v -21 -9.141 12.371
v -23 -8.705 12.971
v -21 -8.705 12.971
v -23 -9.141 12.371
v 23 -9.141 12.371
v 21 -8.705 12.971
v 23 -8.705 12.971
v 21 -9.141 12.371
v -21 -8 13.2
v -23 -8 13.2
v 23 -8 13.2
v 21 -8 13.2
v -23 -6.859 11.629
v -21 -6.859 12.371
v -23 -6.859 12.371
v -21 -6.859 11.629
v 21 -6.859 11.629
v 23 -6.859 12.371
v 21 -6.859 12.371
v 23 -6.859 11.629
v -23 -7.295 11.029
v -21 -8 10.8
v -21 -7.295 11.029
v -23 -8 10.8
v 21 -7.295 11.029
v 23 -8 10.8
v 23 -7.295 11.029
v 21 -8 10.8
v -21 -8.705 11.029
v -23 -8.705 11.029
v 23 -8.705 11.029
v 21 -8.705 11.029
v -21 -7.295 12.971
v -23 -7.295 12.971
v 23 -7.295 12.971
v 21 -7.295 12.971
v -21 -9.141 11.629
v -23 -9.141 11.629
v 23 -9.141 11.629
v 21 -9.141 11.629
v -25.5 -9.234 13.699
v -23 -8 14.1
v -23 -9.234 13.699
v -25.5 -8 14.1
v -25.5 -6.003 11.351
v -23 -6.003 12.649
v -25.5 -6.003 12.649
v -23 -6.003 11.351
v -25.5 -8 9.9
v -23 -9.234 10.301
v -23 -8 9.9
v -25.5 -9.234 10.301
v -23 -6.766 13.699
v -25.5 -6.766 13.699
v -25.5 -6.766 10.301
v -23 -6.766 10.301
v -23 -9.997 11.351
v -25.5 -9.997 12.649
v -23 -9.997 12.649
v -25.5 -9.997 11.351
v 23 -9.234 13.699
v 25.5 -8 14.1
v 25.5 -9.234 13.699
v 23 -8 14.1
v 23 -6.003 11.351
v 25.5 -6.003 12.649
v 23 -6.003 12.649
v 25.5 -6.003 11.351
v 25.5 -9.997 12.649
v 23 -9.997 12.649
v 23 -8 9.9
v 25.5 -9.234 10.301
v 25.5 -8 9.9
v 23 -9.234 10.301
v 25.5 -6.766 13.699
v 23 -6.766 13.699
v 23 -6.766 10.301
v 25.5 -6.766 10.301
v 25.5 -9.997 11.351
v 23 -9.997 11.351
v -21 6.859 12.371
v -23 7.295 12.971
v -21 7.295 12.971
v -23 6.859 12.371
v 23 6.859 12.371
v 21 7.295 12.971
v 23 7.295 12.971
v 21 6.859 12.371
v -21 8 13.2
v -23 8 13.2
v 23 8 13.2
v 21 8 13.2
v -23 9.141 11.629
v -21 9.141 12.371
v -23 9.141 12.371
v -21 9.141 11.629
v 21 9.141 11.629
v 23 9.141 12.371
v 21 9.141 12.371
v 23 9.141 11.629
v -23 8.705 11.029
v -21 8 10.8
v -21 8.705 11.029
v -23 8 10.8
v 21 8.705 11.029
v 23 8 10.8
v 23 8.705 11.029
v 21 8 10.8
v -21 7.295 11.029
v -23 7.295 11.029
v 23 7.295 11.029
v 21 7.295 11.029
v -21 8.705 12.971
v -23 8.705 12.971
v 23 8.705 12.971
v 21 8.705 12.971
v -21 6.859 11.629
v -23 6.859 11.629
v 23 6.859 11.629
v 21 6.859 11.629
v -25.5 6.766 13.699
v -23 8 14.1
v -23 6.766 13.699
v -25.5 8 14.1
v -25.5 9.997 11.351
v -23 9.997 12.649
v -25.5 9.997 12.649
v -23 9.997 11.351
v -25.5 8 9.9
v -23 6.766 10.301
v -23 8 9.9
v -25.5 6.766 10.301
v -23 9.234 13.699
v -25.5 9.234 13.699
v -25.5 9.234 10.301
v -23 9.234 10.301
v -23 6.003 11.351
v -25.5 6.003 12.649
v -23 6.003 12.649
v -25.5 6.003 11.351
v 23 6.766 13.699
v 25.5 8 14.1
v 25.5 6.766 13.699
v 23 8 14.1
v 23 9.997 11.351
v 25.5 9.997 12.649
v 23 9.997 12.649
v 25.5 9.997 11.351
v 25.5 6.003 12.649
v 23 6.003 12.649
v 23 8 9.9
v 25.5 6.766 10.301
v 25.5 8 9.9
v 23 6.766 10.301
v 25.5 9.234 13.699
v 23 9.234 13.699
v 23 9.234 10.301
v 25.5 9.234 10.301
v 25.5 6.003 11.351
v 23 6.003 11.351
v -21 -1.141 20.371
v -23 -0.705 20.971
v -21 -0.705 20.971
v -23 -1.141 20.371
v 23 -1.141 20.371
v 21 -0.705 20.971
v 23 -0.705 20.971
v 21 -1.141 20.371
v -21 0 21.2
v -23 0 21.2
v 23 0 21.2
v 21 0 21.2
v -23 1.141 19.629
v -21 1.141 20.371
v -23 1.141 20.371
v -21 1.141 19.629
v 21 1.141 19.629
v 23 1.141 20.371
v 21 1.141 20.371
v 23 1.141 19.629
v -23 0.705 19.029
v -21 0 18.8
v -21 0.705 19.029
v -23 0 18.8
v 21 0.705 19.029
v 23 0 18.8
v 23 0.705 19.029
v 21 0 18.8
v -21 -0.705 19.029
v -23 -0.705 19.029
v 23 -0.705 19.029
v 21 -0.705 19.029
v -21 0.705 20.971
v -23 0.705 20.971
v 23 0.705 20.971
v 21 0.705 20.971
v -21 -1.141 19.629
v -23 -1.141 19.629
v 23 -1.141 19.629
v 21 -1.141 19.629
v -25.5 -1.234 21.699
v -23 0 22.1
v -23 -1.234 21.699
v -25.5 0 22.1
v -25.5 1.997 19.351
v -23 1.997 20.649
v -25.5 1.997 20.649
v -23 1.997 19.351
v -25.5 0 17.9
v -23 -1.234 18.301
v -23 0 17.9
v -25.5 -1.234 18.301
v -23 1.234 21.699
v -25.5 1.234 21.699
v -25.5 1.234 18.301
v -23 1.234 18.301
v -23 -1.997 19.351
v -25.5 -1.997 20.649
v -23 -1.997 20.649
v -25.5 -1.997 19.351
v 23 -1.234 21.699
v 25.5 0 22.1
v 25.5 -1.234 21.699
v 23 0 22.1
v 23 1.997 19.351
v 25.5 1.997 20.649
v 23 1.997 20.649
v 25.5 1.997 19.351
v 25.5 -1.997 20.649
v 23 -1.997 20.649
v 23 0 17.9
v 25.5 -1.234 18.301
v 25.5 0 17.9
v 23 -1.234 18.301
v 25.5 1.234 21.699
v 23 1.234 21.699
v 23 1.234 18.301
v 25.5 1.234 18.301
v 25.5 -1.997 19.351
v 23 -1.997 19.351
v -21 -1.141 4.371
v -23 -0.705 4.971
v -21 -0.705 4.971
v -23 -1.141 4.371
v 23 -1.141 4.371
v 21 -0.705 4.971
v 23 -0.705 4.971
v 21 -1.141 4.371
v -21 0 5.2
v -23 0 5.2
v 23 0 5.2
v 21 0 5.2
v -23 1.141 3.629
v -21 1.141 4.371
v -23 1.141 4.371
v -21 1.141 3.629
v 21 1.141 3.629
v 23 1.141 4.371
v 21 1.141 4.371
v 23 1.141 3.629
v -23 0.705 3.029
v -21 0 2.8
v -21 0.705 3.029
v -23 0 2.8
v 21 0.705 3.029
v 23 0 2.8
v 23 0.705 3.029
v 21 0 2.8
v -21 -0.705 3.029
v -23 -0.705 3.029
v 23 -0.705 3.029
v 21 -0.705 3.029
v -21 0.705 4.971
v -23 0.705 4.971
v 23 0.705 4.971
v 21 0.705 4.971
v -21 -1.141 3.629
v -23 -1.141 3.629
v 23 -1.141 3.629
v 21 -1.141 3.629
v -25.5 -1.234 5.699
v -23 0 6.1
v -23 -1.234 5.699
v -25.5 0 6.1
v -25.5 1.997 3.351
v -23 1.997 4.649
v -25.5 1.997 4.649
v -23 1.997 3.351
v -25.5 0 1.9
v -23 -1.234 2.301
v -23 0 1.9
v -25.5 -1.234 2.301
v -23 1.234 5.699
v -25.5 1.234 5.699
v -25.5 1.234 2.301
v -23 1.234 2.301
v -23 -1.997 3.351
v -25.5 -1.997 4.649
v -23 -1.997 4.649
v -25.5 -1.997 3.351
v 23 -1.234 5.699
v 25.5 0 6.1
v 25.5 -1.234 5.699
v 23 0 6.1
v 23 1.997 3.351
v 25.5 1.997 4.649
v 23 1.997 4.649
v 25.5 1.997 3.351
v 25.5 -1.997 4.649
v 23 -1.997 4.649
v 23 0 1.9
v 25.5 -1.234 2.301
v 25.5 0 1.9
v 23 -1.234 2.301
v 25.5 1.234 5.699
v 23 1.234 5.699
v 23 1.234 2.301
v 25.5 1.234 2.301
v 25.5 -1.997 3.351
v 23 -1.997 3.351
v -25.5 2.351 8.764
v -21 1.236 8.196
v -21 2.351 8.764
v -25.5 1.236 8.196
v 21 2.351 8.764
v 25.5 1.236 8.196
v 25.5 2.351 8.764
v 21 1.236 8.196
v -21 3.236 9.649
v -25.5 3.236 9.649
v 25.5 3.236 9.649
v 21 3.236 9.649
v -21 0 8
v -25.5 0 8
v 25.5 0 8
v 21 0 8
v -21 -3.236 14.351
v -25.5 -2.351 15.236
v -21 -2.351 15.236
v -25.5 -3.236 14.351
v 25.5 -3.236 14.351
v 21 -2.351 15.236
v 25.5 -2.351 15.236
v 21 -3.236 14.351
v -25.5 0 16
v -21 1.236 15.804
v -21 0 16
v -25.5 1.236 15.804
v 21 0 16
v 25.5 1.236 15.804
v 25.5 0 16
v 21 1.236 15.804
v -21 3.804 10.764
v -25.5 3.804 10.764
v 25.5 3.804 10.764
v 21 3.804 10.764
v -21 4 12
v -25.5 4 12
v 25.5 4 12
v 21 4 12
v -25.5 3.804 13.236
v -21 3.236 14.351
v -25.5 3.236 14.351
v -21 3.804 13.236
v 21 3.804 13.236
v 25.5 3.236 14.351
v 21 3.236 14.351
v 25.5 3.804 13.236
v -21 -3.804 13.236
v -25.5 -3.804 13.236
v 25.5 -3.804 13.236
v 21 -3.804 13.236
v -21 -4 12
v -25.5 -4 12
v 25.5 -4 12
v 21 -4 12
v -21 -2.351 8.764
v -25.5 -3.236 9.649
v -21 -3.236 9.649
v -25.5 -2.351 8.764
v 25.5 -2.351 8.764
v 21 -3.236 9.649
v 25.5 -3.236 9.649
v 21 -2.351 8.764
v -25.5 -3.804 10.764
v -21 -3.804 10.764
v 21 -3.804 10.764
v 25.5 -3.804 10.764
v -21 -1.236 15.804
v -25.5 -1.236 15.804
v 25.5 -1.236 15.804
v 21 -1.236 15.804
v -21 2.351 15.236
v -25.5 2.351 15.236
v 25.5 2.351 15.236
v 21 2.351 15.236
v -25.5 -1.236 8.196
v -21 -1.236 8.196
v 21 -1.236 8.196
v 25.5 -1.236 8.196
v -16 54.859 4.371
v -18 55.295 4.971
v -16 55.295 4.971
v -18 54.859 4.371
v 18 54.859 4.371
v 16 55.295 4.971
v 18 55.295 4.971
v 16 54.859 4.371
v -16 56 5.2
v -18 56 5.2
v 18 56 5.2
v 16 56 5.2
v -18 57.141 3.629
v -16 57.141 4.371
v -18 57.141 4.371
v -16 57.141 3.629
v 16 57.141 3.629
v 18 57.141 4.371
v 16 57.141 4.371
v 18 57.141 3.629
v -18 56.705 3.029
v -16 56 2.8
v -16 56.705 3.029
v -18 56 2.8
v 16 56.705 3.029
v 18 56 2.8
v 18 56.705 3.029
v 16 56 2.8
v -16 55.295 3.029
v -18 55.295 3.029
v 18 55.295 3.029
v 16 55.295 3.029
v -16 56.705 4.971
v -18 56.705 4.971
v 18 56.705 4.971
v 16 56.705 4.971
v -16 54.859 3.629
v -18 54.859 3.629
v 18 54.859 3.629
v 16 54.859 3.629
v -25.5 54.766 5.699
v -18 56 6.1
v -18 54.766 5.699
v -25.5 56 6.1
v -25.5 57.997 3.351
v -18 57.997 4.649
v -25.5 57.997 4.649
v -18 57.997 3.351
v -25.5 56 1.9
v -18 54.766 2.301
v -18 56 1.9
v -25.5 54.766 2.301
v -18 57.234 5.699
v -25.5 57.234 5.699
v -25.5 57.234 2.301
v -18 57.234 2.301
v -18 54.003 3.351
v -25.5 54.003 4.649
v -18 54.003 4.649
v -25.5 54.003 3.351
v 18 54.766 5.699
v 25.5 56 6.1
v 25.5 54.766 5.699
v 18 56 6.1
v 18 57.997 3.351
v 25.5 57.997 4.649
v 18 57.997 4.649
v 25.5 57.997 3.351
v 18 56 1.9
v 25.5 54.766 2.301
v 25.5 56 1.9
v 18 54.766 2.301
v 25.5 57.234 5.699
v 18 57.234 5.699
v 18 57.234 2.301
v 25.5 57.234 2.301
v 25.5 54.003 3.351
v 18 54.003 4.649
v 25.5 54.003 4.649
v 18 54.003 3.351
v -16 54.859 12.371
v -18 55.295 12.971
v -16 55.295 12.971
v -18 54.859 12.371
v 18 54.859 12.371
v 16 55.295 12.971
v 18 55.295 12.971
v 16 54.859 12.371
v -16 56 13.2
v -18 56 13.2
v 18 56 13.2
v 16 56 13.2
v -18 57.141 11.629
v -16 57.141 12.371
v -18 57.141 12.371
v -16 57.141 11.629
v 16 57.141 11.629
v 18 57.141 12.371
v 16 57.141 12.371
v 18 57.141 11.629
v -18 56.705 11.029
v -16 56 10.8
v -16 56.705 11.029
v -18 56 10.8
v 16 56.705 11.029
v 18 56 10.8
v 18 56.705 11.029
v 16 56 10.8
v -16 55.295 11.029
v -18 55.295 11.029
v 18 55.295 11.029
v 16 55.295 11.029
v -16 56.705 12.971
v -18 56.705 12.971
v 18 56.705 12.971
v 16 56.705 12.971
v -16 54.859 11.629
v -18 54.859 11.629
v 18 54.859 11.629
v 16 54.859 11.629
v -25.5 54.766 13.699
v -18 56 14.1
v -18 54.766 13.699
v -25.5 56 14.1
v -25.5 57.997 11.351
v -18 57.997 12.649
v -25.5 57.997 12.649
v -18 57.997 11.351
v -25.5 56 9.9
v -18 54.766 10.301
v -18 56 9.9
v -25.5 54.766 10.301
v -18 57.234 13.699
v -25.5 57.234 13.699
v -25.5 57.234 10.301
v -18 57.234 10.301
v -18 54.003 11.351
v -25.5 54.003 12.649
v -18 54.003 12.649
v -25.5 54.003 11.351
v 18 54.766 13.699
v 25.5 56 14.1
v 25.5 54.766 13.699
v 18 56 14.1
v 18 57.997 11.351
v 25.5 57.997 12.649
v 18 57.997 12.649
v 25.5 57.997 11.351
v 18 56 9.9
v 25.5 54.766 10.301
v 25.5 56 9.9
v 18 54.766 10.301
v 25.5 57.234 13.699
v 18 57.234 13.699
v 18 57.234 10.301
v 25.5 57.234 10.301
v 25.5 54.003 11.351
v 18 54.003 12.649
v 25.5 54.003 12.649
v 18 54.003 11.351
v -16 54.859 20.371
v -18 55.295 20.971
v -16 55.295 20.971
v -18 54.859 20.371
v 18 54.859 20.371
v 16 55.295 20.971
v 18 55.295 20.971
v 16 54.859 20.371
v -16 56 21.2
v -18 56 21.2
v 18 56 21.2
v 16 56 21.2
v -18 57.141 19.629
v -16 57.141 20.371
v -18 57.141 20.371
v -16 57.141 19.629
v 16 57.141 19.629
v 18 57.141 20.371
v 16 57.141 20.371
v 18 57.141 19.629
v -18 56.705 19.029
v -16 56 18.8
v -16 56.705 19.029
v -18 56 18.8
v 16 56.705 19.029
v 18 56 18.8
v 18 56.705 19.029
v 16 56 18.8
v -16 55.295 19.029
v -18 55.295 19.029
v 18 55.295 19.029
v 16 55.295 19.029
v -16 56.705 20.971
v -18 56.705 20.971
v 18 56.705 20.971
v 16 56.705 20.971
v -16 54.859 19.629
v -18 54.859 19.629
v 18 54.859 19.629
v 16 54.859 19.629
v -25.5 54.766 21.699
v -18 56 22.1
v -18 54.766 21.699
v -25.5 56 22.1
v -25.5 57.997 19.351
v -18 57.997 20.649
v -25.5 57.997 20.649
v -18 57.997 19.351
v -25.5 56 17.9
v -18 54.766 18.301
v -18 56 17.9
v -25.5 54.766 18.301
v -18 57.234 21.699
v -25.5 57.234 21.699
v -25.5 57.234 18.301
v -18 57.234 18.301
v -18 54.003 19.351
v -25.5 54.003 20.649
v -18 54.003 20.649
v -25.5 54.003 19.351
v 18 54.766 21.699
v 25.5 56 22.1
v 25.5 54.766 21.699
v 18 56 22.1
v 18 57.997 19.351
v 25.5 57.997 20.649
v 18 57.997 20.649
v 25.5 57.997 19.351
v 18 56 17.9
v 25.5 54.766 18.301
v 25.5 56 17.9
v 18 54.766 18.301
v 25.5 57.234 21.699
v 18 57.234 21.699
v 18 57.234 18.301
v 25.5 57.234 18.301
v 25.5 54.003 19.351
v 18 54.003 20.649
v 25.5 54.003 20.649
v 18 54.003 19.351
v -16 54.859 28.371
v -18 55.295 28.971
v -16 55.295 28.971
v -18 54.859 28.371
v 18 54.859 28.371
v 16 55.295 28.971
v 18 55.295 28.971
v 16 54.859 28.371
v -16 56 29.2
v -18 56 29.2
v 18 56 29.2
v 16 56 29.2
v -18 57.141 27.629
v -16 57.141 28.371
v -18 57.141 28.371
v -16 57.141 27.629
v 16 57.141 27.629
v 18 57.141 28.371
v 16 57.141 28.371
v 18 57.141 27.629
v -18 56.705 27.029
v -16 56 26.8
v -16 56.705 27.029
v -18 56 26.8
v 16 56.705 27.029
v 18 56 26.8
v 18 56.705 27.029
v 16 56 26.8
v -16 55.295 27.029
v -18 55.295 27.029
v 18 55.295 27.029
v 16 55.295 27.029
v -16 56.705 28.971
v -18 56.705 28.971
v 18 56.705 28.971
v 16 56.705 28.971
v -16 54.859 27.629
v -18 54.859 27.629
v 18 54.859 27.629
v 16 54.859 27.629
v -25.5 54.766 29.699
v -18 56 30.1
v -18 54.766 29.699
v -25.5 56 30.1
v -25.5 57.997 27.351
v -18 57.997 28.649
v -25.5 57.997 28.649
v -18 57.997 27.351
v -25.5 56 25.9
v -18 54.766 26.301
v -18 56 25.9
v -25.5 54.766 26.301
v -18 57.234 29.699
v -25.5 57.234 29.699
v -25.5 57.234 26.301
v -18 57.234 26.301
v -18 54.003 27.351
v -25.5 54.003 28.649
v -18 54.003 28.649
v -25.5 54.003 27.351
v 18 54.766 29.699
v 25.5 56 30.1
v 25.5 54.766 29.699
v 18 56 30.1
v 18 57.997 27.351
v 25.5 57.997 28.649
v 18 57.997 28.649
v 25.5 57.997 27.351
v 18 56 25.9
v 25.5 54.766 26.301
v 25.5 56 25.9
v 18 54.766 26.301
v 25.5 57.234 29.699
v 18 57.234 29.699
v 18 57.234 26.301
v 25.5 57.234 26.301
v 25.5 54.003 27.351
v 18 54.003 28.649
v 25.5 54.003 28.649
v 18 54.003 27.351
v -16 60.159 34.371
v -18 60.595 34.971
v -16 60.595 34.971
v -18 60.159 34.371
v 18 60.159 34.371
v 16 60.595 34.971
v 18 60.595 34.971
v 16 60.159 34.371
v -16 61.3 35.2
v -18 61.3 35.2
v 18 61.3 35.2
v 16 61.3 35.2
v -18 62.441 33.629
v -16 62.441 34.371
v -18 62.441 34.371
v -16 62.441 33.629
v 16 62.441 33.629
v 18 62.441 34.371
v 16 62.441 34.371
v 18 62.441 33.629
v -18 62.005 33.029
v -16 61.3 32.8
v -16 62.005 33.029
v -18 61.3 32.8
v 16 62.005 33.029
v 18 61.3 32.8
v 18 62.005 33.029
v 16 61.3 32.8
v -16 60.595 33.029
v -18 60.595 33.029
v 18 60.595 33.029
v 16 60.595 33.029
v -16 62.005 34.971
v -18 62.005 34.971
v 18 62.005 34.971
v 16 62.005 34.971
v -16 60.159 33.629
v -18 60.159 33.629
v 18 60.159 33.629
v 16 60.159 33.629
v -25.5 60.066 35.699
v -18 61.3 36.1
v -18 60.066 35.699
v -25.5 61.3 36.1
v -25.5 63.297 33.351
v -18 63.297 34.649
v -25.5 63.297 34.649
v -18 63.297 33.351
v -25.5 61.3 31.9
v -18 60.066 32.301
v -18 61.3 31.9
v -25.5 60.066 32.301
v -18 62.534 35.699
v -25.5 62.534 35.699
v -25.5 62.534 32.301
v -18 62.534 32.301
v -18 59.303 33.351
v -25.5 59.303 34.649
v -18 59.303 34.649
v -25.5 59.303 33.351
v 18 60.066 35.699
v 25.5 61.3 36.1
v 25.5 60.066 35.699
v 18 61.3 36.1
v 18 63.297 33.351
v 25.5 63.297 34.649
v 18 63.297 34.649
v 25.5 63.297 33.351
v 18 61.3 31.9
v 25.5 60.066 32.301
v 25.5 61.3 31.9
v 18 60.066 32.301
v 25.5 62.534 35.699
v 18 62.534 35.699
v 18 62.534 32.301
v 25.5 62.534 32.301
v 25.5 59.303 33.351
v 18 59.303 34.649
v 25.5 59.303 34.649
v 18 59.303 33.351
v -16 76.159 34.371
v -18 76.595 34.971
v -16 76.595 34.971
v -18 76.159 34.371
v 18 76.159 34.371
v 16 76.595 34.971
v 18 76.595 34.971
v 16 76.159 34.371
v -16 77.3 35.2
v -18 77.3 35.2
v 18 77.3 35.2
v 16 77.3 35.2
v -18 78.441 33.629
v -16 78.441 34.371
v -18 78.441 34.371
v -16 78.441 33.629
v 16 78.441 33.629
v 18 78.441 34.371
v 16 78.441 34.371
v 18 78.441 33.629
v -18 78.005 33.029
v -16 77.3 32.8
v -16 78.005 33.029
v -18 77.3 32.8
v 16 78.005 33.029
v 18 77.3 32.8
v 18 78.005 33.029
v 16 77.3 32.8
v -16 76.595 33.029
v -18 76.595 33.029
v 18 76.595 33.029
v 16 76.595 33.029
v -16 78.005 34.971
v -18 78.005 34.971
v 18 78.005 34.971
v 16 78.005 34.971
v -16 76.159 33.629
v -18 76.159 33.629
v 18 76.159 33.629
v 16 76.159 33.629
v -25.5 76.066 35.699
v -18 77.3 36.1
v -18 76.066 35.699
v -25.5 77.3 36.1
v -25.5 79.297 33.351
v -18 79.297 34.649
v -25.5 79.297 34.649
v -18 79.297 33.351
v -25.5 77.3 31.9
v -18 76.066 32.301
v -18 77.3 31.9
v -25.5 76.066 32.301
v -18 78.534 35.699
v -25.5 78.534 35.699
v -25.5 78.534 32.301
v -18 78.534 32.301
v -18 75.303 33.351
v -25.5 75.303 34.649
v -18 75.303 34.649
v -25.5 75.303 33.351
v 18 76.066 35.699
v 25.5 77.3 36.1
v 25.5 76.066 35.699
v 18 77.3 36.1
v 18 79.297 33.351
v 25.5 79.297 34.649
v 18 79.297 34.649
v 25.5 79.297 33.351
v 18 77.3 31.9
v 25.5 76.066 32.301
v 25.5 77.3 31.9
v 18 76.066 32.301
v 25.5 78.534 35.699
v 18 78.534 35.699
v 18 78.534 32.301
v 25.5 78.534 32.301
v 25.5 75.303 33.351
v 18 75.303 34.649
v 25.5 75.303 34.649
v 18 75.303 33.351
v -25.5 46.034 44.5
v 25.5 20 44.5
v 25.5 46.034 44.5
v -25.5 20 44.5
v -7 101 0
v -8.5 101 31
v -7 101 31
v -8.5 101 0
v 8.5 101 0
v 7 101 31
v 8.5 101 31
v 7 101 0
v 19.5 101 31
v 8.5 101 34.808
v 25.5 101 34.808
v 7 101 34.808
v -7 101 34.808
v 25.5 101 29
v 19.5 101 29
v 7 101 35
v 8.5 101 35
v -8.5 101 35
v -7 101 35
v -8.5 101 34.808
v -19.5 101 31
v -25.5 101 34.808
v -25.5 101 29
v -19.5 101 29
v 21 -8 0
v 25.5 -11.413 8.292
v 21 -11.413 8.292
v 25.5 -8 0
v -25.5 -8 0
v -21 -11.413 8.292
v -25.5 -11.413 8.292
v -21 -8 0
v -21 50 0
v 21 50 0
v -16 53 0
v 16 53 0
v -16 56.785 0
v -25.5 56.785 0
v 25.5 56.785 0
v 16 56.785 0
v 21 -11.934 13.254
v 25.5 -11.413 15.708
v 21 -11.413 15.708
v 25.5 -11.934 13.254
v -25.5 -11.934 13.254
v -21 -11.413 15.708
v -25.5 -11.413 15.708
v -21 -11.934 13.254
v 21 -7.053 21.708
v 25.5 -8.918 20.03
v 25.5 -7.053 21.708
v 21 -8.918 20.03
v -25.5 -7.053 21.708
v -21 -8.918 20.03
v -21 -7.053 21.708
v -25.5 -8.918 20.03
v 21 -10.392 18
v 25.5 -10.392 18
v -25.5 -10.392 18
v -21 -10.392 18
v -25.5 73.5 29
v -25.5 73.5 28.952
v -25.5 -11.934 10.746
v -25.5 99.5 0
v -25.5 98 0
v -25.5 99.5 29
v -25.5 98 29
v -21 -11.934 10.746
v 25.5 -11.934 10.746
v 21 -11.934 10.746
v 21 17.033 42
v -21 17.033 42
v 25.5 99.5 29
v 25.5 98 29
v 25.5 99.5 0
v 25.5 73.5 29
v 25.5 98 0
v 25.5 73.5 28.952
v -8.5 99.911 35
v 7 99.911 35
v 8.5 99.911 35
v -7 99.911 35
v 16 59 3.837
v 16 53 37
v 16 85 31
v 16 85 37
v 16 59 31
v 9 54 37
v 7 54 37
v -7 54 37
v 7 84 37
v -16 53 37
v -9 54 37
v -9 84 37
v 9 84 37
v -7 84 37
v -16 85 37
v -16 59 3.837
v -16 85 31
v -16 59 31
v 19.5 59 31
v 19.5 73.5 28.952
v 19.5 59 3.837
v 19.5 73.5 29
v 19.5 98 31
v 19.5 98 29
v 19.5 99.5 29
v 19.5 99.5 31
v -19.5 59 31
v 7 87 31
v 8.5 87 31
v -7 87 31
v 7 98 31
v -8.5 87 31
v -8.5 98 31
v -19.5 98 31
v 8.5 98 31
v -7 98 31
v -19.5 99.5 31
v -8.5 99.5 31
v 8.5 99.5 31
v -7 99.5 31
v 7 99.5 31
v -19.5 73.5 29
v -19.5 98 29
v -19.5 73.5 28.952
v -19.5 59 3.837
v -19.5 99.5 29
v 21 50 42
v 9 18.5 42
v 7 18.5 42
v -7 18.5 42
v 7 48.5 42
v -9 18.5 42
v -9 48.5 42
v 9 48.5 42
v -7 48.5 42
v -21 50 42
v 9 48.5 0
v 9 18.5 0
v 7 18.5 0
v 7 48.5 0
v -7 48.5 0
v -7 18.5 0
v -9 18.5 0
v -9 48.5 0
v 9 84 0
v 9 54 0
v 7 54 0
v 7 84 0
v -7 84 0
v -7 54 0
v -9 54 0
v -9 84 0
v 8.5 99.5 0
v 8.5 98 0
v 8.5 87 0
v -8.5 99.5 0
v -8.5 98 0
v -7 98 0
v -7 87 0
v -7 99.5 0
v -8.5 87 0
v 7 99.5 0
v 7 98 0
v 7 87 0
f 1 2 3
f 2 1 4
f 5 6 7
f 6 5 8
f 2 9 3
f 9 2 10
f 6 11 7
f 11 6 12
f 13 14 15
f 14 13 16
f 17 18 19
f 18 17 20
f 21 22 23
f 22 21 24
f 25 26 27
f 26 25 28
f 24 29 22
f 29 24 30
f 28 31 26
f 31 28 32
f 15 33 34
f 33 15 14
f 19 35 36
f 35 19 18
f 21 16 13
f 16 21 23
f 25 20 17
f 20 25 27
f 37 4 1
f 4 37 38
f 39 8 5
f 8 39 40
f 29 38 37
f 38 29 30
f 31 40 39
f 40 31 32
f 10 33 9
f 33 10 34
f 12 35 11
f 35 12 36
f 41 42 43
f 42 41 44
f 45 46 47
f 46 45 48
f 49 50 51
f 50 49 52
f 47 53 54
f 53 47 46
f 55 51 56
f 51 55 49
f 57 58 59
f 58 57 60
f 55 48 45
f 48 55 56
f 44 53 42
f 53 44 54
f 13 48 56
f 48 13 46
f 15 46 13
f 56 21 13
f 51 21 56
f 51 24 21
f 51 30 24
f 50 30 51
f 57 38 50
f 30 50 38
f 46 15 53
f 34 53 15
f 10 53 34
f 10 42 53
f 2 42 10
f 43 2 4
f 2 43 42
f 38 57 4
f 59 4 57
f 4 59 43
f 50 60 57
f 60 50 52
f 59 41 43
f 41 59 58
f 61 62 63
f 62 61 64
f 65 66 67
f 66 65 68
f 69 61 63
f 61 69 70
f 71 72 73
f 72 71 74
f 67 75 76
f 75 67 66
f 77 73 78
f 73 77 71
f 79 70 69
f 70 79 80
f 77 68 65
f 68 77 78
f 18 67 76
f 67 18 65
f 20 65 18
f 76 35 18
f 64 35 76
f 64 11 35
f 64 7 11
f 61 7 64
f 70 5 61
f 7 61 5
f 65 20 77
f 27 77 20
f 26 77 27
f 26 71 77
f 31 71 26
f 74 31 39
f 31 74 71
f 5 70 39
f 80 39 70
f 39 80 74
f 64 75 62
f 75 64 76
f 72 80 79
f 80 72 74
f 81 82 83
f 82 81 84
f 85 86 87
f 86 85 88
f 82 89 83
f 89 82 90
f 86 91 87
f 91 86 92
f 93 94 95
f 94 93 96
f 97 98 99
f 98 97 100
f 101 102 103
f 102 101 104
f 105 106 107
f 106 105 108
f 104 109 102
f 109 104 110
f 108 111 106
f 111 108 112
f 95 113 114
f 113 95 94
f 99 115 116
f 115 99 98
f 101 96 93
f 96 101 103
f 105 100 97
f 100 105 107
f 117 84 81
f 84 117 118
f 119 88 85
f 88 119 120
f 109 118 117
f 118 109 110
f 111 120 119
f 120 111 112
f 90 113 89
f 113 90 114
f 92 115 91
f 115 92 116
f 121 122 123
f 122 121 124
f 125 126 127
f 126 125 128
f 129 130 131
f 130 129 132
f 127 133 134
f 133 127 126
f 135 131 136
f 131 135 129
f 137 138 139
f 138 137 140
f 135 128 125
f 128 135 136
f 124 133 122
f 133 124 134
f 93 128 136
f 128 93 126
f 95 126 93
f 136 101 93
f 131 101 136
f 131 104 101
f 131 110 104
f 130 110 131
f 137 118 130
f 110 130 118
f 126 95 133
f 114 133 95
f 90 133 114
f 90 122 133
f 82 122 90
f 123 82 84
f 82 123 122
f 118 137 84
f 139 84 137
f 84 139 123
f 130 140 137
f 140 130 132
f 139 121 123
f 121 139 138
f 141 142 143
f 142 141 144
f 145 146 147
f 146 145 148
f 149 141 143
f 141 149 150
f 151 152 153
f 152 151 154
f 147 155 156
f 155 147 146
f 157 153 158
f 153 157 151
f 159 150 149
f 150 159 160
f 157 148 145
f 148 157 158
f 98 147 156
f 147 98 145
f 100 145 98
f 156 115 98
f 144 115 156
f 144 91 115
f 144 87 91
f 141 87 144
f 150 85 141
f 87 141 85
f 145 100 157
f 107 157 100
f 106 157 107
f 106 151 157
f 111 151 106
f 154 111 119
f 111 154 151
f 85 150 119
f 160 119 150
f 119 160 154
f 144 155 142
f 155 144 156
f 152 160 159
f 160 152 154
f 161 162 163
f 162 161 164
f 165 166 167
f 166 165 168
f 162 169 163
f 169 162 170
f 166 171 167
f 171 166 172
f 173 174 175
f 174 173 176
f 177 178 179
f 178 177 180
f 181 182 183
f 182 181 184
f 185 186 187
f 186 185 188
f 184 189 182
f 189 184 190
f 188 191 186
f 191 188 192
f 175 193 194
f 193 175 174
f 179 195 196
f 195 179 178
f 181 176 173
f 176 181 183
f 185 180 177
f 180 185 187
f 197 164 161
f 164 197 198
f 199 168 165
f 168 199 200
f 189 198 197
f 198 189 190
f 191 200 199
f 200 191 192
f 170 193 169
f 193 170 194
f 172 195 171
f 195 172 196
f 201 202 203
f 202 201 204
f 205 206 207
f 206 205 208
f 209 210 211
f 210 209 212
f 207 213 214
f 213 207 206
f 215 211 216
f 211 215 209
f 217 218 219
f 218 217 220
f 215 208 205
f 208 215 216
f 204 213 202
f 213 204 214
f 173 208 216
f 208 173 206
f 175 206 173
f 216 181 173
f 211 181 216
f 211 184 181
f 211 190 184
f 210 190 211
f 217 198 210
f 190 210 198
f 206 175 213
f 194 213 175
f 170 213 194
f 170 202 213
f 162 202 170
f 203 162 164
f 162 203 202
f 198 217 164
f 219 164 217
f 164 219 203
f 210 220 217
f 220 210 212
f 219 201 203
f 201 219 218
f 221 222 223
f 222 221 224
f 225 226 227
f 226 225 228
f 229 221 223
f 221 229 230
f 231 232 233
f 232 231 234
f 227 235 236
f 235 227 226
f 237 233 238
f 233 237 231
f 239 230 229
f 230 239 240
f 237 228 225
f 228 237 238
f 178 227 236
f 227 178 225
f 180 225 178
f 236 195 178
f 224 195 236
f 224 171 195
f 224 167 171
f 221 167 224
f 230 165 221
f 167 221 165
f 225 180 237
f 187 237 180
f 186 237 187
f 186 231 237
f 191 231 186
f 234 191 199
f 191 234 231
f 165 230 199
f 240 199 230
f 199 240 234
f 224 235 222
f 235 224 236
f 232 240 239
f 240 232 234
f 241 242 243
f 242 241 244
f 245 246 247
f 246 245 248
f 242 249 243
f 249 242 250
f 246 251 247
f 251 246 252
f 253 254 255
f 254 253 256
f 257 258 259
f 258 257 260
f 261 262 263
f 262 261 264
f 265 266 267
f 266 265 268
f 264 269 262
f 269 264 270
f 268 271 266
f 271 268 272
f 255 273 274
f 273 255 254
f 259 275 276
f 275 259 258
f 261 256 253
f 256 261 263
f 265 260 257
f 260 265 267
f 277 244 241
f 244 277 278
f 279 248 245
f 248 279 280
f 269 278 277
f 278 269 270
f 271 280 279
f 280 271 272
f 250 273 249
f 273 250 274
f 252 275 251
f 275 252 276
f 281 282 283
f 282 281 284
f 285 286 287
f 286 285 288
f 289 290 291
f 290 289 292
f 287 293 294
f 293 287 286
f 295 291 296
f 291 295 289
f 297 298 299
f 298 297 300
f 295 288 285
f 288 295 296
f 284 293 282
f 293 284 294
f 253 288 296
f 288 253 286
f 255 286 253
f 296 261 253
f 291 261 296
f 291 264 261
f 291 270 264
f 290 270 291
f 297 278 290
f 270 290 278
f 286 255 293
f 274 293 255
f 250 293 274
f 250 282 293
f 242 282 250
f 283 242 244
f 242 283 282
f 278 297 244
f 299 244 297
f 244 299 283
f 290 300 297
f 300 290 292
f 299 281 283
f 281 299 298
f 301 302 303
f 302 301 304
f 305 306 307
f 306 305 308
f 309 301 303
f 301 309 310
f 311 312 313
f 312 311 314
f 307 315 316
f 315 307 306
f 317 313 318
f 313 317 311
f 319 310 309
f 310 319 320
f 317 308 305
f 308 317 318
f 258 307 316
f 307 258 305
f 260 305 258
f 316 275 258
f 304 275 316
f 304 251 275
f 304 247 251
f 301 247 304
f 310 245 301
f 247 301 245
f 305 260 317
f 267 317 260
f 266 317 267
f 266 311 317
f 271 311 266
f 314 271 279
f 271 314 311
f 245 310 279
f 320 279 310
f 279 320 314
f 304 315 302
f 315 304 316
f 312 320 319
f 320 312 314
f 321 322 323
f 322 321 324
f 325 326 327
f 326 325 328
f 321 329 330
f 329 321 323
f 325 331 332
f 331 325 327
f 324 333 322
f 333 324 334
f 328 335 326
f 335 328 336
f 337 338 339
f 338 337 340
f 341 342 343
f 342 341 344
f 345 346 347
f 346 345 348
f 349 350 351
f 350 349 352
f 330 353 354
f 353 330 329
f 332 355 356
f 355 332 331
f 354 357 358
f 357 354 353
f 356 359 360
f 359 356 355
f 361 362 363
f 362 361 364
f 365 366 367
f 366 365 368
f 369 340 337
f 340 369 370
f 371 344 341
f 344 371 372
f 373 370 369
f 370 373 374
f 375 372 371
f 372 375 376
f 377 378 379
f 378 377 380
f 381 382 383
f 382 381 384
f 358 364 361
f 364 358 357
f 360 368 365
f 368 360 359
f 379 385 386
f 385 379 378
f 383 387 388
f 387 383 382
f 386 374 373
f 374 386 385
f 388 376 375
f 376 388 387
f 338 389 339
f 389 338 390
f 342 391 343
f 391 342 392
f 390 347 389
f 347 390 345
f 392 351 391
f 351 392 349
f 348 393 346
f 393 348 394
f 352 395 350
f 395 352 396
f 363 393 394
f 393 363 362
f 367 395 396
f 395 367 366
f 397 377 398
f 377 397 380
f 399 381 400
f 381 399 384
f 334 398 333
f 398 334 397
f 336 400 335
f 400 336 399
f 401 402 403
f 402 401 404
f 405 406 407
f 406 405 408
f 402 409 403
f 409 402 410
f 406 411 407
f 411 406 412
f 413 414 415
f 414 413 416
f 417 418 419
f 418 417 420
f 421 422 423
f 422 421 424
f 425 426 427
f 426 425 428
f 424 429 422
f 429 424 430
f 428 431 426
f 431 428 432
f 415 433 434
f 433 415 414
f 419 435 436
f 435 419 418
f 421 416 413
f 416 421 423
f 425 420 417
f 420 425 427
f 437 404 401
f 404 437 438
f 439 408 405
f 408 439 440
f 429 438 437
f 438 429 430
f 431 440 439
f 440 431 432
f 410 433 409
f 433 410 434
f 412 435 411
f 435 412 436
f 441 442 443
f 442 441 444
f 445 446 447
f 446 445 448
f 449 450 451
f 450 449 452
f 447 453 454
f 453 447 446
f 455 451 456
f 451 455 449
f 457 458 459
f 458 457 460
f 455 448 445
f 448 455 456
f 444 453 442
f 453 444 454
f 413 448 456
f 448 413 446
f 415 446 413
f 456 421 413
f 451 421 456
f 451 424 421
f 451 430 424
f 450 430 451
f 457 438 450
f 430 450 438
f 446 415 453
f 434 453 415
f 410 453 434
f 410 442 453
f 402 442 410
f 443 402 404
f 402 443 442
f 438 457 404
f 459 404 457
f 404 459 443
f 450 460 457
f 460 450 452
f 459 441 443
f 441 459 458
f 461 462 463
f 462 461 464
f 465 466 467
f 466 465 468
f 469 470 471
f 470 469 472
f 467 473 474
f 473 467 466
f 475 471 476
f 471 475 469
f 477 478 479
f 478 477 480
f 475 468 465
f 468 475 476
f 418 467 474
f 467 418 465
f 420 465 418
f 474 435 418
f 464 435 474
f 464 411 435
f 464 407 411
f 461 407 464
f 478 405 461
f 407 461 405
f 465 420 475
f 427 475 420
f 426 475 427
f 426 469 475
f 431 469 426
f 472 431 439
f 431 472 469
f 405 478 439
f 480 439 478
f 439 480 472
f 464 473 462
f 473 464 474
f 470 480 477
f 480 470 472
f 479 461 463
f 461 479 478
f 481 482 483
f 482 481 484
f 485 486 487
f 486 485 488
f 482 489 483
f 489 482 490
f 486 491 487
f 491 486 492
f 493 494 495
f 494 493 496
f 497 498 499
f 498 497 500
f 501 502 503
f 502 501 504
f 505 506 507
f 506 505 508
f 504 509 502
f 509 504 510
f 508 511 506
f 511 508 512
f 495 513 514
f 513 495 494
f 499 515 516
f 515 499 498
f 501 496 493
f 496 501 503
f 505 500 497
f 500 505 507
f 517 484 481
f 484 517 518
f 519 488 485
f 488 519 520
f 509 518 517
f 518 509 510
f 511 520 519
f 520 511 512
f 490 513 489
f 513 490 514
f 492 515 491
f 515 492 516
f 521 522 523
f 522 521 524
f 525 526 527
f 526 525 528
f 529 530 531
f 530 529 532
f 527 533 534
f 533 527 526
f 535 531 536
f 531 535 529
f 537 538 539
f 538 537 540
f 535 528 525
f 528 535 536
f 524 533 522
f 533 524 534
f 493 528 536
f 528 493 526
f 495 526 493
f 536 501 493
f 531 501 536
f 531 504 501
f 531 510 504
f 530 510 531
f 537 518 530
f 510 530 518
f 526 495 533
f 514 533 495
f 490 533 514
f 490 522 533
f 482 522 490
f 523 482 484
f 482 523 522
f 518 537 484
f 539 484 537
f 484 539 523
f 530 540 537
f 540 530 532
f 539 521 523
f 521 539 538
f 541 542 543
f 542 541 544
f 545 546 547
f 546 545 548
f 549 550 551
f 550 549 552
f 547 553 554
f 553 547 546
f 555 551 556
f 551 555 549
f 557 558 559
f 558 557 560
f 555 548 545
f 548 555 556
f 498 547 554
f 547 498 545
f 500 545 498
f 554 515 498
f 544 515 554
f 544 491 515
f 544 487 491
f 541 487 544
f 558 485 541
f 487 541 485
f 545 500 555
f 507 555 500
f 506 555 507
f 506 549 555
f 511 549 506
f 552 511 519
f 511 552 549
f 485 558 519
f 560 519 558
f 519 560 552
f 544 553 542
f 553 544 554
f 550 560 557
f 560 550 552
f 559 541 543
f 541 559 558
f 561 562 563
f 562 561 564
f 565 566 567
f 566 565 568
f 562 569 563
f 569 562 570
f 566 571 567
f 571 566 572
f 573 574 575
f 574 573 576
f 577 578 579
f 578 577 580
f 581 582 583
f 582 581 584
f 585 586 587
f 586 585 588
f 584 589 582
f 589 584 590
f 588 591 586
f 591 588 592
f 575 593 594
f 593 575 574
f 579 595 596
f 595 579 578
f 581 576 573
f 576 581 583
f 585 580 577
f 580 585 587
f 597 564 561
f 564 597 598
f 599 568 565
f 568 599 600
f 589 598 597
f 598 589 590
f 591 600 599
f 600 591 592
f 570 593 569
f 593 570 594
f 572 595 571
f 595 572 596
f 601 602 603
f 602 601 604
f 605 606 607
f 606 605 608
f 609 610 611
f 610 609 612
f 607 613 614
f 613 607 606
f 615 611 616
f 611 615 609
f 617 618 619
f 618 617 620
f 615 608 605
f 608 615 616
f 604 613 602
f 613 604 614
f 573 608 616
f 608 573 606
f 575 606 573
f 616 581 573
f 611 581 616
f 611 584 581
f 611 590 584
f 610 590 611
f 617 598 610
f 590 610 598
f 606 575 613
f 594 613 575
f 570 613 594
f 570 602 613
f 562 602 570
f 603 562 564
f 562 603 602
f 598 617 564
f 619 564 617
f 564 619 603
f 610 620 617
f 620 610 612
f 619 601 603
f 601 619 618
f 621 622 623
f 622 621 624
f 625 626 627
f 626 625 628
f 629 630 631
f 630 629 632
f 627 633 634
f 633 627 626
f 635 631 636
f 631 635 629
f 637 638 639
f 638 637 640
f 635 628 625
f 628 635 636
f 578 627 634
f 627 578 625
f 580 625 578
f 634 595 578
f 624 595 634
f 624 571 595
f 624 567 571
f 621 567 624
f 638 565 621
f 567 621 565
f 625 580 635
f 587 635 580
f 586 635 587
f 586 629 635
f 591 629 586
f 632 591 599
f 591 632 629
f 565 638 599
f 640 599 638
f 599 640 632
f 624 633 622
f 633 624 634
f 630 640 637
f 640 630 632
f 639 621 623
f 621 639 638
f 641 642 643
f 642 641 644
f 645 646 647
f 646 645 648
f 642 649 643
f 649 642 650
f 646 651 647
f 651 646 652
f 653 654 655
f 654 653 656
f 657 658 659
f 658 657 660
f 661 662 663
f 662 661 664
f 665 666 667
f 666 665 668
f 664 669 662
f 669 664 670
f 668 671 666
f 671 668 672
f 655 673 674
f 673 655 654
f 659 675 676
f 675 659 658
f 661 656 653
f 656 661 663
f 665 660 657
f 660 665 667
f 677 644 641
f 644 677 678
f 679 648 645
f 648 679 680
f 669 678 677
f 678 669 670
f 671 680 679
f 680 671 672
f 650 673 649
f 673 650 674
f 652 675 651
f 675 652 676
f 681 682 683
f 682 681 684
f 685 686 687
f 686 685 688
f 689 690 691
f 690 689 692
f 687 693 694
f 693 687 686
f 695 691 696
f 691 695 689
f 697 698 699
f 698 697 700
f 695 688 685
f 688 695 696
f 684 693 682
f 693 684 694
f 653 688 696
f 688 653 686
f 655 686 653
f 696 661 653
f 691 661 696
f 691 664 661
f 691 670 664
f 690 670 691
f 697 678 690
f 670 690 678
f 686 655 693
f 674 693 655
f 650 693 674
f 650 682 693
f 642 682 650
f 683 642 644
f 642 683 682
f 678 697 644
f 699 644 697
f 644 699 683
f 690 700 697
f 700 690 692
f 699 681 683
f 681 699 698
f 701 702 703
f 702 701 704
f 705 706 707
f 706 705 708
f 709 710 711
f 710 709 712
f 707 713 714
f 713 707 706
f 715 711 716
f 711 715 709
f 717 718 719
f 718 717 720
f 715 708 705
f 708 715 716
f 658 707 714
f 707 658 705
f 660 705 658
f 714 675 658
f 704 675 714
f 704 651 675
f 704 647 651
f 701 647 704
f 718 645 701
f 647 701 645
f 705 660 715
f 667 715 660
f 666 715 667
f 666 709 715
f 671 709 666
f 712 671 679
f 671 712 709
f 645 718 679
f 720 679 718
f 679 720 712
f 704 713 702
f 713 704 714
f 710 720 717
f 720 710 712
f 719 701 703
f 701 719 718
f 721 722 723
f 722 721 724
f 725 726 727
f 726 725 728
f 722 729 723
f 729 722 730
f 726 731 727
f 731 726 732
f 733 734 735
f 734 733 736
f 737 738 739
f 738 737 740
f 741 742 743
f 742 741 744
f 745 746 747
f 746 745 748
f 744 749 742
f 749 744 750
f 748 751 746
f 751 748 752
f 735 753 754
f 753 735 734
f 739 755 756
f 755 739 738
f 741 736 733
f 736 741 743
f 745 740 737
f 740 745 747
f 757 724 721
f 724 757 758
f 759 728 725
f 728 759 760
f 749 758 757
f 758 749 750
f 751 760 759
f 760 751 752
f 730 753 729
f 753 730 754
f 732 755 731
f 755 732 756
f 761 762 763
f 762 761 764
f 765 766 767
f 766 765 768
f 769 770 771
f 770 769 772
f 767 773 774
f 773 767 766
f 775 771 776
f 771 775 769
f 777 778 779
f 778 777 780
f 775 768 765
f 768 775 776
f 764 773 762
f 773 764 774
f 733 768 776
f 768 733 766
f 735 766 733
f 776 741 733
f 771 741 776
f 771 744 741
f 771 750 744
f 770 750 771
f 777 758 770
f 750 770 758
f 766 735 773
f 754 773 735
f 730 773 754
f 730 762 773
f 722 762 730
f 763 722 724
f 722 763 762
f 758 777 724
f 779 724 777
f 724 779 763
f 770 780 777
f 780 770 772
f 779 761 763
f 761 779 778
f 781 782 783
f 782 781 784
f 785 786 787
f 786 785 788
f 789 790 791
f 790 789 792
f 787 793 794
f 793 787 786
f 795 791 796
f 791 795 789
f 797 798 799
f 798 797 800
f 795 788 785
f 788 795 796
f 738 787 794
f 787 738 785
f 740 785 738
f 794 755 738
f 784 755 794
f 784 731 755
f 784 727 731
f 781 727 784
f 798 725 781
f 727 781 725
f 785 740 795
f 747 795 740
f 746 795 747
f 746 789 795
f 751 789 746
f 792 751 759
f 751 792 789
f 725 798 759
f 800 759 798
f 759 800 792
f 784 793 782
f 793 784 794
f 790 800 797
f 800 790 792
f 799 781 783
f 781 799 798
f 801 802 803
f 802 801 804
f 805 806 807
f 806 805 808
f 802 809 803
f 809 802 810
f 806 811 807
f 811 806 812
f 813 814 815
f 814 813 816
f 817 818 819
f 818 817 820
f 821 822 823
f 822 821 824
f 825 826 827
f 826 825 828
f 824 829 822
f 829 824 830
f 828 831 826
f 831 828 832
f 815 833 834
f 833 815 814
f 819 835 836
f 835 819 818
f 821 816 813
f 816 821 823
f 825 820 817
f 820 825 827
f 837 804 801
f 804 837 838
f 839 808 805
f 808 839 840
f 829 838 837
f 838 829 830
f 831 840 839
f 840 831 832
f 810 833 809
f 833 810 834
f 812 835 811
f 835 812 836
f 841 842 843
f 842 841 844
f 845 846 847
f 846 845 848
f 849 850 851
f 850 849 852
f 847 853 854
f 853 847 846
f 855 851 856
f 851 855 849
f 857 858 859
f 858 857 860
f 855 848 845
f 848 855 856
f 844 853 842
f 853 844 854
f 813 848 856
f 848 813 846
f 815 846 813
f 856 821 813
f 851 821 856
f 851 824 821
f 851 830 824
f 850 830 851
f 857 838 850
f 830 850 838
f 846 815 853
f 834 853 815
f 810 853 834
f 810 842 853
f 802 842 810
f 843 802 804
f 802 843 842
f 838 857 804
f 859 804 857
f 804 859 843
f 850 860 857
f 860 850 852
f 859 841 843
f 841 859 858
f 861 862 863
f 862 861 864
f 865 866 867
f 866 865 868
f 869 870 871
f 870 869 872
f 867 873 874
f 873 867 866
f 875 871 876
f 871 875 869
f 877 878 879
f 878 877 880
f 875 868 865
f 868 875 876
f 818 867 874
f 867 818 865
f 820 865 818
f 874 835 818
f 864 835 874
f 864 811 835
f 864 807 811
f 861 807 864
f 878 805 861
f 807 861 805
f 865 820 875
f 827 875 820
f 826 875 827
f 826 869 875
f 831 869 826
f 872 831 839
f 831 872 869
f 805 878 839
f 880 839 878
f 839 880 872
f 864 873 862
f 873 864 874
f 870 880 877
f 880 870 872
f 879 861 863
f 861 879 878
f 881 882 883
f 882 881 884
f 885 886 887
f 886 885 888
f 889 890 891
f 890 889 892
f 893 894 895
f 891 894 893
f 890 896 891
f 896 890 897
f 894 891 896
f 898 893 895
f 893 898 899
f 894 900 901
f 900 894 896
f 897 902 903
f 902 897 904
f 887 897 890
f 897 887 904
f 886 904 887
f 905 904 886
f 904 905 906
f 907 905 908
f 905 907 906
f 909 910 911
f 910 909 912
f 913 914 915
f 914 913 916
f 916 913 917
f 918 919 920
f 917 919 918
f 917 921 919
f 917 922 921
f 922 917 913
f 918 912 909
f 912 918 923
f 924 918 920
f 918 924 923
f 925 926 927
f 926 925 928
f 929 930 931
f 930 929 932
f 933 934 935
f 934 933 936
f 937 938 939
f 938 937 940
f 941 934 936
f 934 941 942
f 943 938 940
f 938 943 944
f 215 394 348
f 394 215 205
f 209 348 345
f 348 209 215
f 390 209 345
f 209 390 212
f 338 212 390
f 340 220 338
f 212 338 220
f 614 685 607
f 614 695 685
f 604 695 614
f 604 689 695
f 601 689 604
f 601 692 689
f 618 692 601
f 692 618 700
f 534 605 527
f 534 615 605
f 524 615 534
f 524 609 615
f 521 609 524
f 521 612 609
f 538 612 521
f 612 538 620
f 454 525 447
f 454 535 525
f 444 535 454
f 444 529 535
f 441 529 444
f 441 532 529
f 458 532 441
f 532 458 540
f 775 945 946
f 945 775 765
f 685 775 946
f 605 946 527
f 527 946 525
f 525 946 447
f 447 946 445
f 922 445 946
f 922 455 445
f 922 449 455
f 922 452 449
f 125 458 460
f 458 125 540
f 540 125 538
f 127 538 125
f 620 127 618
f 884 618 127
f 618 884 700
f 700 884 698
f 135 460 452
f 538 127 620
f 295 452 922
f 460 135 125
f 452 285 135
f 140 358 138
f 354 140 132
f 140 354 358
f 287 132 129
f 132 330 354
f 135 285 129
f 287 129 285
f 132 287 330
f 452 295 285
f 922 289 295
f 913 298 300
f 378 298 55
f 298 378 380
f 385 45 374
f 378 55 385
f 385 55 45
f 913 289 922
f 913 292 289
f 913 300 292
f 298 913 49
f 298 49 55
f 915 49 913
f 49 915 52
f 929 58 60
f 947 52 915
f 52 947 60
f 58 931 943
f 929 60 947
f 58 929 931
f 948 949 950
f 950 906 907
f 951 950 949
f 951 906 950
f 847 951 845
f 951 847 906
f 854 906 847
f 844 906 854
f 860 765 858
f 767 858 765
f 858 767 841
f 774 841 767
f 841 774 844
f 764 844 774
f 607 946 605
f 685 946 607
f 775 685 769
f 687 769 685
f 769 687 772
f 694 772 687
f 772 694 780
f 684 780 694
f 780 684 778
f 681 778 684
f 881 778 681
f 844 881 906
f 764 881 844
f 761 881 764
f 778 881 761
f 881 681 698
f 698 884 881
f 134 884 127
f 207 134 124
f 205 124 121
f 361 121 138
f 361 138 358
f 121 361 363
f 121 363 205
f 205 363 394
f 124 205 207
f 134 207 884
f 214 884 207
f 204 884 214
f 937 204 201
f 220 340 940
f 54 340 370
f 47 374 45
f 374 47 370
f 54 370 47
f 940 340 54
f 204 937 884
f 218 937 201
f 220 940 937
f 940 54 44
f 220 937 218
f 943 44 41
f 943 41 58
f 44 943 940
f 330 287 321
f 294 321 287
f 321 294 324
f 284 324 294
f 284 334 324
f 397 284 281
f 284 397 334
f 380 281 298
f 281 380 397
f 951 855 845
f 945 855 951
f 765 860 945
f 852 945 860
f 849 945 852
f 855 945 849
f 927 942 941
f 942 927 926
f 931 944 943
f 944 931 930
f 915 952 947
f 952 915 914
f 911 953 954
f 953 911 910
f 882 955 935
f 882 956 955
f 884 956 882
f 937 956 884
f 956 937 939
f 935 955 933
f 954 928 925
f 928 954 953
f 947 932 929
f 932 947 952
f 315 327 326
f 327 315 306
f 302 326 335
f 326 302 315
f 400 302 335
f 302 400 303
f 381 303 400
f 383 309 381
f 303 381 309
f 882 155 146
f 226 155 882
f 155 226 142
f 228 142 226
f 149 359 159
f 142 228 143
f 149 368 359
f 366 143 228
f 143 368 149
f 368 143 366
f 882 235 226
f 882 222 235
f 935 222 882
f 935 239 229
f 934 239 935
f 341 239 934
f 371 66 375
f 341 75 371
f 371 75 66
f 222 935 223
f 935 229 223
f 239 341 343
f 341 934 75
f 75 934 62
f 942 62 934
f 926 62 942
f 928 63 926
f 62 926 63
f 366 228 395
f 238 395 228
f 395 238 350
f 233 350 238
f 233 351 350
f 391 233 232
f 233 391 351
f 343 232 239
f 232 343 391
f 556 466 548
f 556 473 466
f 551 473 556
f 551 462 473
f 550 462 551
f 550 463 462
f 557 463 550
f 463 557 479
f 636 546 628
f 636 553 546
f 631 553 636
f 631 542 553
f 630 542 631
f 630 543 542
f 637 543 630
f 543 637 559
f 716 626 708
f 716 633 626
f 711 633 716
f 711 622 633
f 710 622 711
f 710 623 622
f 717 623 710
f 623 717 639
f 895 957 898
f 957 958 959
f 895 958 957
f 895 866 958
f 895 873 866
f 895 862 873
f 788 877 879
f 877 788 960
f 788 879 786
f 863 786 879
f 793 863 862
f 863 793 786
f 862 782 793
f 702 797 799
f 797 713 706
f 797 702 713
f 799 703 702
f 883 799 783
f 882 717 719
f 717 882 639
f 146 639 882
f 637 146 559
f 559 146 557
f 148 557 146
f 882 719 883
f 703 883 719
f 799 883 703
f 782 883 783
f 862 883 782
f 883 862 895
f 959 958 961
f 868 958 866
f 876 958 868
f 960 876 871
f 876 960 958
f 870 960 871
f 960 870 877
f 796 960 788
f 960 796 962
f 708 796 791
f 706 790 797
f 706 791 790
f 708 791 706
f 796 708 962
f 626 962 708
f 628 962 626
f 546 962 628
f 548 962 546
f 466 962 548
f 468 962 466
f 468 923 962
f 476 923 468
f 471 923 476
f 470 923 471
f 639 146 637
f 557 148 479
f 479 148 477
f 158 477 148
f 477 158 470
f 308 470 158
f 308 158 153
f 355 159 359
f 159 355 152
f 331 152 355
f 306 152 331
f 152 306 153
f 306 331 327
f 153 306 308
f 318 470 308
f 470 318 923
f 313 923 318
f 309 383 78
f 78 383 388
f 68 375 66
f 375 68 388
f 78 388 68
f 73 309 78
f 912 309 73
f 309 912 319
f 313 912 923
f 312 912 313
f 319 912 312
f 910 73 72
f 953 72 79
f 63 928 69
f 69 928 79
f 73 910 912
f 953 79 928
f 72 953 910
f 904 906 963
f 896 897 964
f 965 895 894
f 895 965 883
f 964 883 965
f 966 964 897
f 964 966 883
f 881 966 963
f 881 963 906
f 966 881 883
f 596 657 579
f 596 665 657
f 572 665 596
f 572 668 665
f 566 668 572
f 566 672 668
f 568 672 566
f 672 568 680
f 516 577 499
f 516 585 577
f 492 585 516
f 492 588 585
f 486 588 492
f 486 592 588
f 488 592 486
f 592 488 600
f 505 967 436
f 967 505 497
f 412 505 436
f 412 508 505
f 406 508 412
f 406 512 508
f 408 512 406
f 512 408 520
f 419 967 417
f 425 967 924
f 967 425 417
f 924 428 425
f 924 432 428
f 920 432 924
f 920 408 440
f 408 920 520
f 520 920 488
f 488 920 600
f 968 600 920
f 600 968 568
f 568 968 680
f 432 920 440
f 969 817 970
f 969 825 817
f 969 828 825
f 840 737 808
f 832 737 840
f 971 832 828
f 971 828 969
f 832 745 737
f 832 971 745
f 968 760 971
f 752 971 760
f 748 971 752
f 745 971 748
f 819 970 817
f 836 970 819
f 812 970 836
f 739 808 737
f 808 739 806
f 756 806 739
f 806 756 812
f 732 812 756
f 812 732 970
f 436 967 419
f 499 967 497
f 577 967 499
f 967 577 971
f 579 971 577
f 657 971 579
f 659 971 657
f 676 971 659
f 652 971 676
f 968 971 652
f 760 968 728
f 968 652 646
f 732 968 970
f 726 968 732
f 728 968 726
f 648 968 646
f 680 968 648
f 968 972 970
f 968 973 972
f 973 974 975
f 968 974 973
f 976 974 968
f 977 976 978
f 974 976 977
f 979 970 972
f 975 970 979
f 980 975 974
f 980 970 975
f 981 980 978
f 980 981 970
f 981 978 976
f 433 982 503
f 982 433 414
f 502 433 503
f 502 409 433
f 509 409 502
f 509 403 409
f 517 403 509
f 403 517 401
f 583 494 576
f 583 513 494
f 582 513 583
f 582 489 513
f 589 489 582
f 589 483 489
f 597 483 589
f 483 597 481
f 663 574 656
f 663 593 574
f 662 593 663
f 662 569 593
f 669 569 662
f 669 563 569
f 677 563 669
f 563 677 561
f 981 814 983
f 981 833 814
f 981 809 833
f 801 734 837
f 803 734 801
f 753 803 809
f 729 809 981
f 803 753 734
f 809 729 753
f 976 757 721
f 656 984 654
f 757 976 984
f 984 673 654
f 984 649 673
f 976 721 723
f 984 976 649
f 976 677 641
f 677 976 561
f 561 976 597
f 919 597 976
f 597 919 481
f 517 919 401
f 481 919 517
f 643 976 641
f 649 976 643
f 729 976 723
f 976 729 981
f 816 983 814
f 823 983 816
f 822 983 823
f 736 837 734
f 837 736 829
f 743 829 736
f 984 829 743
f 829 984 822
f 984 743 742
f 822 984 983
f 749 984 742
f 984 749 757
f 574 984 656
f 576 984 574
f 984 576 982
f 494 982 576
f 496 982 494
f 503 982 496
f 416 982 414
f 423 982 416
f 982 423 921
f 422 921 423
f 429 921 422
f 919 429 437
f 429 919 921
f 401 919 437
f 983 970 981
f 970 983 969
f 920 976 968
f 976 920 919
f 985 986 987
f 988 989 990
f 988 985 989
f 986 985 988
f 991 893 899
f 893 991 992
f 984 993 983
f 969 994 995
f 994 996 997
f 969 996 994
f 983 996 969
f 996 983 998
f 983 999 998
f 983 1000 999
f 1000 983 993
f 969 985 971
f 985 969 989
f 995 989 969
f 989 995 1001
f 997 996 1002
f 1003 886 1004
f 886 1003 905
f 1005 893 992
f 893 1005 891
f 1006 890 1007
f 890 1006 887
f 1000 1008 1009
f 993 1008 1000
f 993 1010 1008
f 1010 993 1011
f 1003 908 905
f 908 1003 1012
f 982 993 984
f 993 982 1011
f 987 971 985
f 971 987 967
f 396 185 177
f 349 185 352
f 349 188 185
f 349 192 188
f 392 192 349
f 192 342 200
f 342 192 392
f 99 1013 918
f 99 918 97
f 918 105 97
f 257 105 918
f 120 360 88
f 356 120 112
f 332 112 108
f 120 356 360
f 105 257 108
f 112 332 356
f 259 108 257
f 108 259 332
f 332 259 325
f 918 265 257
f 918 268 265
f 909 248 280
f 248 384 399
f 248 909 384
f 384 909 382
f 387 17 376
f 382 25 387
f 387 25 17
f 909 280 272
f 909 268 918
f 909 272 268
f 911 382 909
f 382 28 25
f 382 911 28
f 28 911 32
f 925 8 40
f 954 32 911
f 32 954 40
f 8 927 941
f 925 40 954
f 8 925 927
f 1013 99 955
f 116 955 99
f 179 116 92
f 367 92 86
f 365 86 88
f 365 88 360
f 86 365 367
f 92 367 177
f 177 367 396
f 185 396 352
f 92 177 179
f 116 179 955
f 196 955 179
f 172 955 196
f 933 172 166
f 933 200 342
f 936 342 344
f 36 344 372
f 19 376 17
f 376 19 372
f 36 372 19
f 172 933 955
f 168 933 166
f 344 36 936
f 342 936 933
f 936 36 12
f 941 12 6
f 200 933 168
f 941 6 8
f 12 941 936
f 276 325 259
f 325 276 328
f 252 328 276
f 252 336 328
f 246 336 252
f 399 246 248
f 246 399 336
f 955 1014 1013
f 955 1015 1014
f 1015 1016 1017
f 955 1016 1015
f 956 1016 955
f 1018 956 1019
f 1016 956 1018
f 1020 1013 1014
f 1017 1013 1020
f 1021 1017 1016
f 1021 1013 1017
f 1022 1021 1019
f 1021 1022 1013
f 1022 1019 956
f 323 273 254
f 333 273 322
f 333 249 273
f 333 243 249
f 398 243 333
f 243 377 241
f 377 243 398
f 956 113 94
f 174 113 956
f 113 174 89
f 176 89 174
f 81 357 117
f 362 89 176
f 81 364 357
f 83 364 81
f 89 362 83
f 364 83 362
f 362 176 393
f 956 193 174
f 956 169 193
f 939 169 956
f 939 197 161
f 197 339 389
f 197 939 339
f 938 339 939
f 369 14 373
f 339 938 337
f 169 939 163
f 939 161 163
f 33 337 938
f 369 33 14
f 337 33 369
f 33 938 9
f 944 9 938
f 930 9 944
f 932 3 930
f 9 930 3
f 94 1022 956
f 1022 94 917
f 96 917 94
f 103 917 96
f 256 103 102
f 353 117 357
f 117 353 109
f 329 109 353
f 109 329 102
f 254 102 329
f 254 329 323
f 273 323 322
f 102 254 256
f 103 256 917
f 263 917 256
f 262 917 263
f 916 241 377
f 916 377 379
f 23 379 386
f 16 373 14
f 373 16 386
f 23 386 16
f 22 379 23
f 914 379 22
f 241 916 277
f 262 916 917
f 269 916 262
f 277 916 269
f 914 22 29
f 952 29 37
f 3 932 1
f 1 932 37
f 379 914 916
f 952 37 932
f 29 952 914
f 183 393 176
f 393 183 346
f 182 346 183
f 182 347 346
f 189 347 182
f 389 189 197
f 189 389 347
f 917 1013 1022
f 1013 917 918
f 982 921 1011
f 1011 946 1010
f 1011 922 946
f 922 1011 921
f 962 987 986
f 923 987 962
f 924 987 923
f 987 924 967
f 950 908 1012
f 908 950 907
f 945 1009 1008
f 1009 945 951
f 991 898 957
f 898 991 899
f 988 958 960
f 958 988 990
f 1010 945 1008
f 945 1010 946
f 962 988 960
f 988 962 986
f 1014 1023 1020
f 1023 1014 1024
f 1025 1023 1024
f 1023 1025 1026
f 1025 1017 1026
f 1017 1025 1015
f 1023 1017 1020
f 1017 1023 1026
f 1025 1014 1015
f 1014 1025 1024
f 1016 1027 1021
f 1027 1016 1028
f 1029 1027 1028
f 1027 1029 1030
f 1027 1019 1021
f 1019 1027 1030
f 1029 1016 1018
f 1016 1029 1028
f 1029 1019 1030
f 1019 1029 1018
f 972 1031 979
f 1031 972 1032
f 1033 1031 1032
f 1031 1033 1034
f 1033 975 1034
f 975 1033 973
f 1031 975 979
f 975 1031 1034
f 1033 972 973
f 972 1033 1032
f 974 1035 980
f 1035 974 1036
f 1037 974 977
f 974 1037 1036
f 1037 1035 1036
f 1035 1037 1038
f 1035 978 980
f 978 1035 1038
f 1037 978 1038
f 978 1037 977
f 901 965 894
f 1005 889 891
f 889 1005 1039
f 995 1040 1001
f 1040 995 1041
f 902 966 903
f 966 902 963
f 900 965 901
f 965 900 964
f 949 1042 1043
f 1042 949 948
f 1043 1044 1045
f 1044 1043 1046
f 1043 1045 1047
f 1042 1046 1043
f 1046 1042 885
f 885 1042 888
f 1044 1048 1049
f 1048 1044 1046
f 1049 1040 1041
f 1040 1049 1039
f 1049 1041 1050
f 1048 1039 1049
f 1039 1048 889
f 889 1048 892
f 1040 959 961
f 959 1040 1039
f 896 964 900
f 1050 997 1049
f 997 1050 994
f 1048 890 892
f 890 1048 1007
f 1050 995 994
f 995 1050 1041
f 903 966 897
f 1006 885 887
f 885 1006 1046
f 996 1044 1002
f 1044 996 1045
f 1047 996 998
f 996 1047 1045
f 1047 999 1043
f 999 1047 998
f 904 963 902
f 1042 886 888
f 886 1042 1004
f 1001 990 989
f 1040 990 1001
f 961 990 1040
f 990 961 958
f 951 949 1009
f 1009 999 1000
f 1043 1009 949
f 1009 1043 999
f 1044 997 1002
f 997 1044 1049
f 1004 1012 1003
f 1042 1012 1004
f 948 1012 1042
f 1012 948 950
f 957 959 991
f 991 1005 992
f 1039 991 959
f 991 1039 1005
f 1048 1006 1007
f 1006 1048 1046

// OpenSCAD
espesor=4.5;

module tornillo(d){
	union(){
		rotate([0,90,0])cylinder(r=1.2,h=60,$fn=10);
		translate([-1-d,0,0])rotate([0,90,0])cylinder(r=2.1,h=10,$fn=10);
		translate([51+d,0,0])rotate([0,90,0])cylinder(r=2.1,h=10,$fn=10);


	}
}

module eje(){
	rotate([0,90,0])cylinder(r=4,h=60,$fn=20);
	translate([0,-8,0])tornillo(2);
	translate([0,8,0])tornillo(2);
	translate([0,0,8])tornillo(2);
	translate([0,0,-8])tornillo(2);
}

module agujeros_servo(){
	translate([0,0,-8]) tornillo(-3);
	translate([0,0,0]) tornillo(-3);
	translate([0,0,8]) tornillo(-3);
	translate([0,0,16]) tornillo(-3);
	translate([0,5.3,22]) tornillo(-3);
	translate([0,5.3+16,22]) tornillo(-3);
}

y=32;
union(){
translate([0,0,12])
difference(){
	hull(){
	translate([-(42+espesor*2)/2,-12+y,-12])cube([42+espesor*2,113-y,40+espesor]);
	translate([-25.5,0,0])rotate([0,90,0])cylinder(r=12,h=51);
	translate([-51/2,-8,-12])cube([51,5,4]);
	translate([-51/2,-4,-12])cube([51,4,1]);
	}
	rotate([-10,0,0])translate([-50,0,40])cube(100);
	translate([-32/2,53,-21])cube([32,32,46]);
	translate([-19.5,59,-19])cube([39,50,38]);
	translate([-42/2,-38,-13])cube([42,44+42+2,43]);
	translate([-30,0,0])eje();

	translate([-30,56,0])agujeros_servo();
	//%translate([-30,-72,28])rotate([-45,0,0])cube([60,60,80]);
	//%translate([-30,-72,-27])rotate([-45,0,0])cube([60,60,60]);
	translate([-30,36,-48])rotate([-30,0,0])cube([60,60,75]);
	translate([-30,73.5,-58])rotate([0,0,0])cube([60,60,75]);
	//translate([-50,-111,-12])cube(100);
}
//SOPORTES


translate([7,18.5,0])cube([2,30,43]);
mirror([10,0,0])translate([7,18.5,0])cube([2,30,43]);

translate([7,54,0])cube([2,30,37]);
mirror([10,0,0])translate([7,54,0])cube([2,30,37]);

translate([7,87,0])cube([1.5,14,35]);
mirror([10,0,0])translate([7,87,0])cube([1.5,14,35]);

translate([25.5,98,0])rotate([0,0,90])cube([1.5,51,35]);



}
